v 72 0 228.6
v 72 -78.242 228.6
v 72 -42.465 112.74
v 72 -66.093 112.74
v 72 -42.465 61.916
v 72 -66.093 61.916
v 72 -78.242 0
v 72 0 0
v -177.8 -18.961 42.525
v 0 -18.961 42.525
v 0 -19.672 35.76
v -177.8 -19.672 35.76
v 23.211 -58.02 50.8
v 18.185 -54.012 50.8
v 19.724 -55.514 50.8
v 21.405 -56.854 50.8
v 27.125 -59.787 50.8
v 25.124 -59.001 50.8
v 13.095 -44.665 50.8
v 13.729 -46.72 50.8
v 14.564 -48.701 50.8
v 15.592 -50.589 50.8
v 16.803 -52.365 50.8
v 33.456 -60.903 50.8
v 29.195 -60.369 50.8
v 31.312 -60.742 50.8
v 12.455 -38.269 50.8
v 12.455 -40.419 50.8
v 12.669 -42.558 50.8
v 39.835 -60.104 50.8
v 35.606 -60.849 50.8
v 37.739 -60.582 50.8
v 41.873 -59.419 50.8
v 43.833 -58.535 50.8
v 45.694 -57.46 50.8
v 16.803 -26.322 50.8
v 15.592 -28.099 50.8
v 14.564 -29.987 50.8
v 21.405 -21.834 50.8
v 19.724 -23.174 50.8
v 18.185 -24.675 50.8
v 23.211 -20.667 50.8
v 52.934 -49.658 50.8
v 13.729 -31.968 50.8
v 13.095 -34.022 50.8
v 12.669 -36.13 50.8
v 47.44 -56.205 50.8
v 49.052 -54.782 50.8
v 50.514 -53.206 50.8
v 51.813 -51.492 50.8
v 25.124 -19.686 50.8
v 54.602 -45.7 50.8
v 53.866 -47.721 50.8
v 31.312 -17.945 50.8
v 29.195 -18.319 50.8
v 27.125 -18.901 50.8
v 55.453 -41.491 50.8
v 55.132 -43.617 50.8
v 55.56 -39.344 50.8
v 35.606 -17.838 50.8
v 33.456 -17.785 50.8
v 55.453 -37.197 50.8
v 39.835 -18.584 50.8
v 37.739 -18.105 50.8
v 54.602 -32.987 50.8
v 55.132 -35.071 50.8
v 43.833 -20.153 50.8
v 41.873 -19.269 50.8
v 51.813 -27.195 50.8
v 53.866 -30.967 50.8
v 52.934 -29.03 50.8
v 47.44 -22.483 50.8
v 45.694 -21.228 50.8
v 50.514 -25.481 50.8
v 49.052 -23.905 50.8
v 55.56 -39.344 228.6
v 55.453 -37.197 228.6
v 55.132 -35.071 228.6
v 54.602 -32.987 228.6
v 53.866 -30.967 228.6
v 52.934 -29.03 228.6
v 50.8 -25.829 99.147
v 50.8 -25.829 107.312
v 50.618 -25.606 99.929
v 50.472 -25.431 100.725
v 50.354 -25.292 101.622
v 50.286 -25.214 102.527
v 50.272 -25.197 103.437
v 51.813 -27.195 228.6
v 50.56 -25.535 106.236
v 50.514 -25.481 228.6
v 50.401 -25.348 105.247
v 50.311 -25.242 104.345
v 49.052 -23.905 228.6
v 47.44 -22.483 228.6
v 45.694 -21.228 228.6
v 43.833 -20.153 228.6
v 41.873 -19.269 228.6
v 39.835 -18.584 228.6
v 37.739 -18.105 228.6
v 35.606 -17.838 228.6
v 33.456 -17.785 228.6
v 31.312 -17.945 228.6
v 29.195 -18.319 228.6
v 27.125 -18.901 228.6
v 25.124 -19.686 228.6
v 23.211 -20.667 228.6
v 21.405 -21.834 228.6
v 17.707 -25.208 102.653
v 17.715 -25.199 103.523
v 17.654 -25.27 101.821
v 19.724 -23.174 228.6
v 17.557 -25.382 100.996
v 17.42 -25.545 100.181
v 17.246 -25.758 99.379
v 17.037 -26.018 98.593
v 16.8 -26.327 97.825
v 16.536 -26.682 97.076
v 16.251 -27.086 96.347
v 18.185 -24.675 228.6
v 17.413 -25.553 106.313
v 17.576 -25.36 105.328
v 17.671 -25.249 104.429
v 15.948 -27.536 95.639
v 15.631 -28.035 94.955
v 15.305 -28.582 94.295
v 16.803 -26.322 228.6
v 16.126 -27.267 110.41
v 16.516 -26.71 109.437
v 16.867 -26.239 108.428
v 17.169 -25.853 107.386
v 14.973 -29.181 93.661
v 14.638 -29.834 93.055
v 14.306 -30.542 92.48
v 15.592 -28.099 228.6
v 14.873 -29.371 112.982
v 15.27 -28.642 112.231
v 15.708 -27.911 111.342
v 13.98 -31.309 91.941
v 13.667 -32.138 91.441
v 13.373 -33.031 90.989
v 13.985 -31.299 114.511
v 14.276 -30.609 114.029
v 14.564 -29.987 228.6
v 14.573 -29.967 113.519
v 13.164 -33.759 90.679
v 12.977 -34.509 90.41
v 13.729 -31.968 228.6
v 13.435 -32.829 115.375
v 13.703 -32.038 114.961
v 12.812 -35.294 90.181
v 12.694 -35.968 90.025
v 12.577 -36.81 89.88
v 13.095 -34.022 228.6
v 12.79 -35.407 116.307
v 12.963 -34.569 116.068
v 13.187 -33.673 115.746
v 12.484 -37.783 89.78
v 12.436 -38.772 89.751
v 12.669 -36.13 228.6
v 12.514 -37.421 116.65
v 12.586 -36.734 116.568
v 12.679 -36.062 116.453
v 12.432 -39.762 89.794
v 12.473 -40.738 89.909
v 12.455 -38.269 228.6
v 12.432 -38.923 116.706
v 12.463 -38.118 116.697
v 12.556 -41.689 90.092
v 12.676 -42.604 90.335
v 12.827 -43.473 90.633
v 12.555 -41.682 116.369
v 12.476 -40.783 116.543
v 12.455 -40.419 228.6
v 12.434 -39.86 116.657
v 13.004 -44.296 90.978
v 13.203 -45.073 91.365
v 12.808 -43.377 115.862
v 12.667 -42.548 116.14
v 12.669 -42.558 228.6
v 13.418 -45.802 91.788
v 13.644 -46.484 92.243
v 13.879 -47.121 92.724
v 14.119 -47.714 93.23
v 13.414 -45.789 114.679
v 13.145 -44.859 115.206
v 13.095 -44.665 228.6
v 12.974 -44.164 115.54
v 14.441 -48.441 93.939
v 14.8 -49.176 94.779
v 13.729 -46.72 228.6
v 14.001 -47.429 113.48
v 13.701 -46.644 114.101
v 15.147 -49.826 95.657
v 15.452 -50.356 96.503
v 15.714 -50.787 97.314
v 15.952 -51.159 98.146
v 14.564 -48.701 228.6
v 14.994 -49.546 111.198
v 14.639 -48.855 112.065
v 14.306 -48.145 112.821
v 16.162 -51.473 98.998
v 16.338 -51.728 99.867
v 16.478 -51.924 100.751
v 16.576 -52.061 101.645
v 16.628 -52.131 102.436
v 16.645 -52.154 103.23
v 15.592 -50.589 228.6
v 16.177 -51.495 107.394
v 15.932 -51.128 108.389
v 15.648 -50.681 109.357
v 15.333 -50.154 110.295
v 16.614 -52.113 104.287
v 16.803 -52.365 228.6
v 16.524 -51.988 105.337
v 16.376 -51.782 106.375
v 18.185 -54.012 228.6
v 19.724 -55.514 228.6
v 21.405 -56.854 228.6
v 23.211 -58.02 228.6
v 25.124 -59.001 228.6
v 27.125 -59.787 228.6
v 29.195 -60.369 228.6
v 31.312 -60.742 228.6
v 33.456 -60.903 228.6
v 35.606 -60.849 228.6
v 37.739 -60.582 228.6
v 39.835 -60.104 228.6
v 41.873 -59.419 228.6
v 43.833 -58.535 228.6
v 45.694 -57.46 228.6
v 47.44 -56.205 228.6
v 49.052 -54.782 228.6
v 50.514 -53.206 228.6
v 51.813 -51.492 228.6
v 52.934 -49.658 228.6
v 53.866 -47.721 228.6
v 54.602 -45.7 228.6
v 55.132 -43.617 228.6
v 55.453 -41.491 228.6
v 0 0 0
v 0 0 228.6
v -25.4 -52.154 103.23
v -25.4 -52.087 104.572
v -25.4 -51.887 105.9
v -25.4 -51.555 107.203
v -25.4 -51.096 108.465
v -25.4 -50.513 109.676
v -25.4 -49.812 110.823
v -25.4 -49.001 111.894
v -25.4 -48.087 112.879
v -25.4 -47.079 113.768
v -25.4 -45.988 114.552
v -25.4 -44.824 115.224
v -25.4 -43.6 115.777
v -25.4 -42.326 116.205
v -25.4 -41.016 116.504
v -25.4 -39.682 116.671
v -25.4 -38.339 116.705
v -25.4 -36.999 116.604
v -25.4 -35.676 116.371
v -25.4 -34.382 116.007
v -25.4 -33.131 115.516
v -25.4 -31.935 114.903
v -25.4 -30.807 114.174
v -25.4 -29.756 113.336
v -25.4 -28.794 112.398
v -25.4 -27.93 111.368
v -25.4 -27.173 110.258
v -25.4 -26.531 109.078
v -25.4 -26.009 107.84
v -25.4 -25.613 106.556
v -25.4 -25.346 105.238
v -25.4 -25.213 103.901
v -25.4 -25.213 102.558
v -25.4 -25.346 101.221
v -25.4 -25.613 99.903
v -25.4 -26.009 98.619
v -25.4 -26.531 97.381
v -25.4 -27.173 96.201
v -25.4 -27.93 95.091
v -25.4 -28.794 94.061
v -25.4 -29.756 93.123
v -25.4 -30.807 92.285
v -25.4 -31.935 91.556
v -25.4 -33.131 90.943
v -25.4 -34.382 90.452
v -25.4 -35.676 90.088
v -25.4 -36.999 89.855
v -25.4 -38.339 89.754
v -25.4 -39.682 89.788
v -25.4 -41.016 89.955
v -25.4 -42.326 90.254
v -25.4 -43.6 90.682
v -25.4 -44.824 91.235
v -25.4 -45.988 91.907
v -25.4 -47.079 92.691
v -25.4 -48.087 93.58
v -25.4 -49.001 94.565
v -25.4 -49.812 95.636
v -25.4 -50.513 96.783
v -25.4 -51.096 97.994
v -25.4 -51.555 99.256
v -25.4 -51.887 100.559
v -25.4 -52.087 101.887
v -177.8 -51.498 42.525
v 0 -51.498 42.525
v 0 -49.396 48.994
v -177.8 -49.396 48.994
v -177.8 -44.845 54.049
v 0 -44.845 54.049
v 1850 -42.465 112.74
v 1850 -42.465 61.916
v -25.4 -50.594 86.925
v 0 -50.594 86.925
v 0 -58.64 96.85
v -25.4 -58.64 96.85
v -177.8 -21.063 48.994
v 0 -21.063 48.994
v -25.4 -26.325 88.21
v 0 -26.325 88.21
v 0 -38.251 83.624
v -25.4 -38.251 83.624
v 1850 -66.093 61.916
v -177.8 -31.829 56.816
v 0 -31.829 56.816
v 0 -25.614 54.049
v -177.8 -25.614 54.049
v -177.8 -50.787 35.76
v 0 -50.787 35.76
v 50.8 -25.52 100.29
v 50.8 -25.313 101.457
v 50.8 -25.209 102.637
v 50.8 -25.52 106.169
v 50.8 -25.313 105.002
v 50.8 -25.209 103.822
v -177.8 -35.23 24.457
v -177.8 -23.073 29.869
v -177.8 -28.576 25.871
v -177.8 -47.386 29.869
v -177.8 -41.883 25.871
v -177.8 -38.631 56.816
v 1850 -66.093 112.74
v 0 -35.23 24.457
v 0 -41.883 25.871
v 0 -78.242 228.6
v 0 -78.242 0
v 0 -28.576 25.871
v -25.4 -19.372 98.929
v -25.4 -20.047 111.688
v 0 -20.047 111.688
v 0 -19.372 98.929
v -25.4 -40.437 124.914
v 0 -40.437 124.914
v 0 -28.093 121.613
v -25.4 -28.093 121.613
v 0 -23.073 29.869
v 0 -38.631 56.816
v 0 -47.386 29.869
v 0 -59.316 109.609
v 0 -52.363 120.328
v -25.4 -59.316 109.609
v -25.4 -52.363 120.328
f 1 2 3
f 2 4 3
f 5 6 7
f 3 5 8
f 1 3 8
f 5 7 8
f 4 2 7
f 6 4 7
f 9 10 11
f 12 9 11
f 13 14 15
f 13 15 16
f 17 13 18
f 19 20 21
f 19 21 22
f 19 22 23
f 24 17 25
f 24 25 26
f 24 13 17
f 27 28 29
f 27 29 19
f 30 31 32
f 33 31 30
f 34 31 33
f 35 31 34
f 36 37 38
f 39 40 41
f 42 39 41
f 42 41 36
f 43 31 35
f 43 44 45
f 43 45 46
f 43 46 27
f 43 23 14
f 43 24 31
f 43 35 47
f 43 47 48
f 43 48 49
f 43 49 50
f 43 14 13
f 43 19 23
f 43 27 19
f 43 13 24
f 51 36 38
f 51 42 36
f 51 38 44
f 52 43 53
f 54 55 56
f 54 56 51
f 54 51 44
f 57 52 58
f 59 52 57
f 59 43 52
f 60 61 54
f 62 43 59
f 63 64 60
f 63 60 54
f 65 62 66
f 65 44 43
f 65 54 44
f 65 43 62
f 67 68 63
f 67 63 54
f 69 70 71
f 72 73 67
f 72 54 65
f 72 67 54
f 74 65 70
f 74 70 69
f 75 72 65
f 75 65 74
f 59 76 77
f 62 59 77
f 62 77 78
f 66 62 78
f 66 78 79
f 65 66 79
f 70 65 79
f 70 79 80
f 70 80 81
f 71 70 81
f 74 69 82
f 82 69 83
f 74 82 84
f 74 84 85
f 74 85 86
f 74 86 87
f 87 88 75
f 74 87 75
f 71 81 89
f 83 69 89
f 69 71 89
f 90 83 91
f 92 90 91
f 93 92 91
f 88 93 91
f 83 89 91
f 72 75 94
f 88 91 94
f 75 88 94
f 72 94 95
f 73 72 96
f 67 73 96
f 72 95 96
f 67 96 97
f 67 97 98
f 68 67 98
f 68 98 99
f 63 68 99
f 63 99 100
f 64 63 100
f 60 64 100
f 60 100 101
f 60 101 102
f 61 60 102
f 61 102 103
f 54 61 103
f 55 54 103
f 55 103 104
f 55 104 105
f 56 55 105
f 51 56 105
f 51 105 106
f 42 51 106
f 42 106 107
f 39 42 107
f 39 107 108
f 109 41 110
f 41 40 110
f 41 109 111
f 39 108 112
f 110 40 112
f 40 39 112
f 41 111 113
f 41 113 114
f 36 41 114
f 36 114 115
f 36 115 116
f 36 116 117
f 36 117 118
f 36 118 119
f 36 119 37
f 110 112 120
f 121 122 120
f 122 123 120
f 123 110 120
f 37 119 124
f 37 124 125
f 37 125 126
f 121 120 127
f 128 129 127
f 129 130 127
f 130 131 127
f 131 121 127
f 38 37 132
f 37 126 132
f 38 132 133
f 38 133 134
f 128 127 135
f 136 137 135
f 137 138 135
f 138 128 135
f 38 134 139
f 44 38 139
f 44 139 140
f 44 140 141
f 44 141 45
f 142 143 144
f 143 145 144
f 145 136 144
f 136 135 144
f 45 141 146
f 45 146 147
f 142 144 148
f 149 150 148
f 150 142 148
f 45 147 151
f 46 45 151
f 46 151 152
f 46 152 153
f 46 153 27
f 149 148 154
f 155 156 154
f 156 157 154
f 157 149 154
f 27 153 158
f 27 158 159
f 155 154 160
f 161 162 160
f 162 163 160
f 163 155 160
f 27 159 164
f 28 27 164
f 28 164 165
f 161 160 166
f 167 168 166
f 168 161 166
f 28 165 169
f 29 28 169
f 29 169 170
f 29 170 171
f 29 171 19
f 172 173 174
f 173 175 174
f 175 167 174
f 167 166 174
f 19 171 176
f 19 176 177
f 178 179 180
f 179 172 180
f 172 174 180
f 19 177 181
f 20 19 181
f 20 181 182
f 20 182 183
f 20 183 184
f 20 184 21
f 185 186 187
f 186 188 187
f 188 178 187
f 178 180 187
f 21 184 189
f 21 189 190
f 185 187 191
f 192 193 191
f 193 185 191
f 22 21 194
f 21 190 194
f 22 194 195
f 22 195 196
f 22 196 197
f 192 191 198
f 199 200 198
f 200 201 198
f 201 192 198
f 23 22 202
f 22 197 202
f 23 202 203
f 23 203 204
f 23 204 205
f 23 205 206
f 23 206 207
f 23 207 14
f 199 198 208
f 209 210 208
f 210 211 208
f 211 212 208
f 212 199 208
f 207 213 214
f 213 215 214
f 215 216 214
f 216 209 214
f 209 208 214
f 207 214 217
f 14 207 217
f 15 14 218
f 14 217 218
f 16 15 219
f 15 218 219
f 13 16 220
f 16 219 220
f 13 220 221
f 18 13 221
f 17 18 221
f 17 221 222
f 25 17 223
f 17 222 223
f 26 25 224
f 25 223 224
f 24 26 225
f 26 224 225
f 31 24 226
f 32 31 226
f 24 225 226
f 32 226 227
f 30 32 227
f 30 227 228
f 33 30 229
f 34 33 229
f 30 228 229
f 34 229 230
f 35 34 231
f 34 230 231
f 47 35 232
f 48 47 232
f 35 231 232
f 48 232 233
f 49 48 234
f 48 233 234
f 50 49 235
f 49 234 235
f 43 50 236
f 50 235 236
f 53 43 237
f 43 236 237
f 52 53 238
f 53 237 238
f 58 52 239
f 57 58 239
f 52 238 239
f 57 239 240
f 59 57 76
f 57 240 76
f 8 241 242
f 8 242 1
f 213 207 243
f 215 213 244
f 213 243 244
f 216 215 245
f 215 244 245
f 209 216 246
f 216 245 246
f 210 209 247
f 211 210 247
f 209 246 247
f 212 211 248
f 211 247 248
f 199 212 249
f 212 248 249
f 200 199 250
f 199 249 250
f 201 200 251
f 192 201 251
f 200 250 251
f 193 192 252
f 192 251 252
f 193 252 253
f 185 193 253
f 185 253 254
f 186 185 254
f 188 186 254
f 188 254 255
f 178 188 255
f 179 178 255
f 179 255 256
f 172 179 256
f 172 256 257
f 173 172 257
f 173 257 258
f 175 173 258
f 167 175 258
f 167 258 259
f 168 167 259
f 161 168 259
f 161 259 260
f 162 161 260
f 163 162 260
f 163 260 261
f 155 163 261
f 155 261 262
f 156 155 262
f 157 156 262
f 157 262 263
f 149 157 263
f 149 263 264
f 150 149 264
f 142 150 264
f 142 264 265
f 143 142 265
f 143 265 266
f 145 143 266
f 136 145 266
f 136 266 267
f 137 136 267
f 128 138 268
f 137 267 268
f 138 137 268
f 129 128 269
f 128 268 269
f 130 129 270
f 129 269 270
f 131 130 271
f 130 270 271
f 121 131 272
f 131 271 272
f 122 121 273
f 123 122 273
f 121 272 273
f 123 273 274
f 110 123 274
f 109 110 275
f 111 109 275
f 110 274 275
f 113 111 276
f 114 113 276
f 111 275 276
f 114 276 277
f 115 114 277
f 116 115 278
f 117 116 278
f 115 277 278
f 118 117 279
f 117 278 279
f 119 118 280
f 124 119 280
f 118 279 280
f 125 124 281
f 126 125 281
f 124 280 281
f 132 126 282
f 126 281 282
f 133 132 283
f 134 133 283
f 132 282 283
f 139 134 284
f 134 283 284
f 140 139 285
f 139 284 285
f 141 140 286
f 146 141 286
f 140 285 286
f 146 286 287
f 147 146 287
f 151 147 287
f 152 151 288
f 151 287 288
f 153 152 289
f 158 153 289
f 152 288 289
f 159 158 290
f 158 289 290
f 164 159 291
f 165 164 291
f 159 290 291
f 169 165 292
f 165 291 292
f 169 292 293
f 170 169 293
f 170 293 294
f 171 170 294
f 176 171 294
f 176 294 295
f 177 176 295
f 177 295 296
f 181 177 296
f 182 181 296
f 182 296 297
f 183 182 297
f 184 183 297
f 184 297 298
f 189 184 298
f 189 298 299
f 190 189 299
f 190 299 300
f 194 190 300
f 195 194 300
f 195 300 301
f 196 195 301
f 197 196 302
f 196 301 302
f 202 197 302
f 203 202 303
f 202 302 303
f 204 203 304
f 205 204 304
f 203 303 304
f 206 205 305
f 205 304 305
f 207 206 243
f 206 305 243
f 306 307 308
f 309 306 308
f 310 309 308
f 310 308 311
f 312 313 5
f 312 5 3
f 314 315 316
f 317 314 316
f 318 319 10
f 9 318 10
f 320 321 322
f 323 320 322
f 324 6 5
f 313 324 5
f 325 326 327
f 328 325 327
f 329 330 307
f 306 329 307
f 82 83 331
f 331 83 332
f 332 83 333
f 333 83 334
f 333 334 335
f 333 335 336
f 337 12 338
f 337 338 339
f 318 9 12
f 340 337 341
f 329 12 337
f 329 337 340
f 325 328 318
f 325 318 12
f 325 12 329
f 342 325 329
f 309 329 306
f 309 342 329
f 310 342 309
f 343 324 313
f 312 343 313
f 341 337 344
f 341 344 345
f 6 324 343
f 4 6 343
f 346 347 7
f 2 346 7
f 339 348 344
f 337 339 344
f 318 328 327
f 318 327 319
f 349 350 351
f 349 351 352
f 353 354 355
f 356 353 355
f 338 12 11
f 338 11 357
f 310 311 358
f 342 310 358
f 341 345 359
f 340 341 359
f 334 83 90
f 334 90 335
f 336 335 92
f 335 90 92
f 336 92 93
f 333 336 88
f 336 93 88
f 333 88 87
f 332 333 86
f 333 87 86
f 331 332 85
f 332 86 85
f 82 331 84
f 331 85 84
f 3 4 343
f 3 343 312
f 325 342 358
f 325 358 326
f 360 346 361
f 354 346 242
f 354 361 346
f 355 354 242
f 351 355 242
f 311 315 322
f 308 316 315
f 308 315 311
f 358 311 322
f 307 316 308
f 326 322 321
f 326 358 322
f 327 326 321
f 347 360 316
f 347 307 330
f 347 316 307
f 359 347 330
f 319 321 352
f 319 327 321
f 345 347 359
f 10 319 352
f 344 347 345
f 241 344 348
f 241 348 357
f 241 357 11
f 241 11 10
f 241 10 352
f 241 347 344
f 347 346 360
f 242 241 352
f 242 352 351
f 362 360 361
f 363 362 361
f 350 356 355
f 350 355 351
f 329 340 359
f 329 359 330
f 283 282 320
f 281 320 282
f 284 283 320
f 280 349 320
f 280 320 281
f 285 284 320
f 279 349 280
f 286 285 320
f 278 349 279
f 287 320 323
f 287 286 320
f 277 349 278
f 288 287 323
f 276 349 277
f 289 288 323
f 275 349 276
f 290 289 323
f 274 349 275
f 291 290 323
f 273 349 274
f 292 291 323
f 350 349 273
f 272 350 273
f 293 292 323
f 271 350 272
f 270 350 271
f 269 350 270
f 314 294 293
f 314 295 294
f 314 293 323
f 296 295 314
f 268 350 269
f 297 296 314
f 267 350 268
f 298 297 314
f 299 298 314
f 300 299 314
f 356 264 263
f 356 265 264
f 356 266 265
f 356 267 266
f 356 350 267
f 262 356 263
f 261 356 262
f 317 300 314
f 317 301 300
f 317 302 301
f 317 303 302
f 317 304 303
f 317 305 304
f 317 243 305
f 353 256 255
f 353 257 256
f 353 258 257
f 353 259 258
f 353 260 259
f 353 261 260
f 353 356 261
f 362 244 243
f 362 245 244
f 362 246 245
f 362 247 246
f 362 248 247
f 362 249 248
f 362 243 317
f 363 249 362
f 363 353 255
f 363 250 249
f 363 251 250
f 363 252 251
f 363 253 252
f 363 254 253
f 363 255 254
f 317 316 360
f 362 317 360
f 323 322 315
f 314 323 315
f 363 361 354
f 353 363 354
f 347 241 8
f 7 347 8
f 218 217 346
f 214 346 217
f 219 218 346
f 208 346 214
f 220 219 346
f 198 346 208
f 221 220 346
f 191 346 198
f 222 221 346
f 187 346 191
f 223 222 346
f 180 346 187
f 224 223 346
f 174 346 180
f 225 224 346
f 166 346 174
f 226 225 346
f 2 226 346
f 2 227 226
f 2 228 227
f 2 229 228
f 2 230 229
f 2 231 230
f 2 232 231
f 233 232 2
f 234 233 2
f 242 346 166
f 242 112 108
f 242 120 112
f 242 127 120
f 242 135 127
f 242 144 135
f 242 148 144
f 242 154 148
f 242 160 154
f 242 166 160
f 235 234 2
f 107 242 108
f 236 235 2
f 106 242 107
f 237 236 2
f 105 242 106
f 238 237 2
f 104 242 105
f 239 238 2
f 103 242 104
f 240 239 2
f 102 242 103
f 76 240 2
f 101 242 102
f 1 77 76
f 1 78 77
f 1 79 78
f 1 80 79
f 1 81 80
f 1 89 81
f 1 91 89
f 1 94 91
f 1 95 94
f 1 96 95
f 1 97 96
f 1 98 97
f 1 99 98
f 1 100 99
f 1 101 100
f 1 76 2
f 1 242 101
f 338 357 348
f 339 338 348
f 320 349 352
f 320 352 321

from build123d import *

# Parameters (mm, degrees)
F0_W      = 72.000258
F0_H      = 78.241773
F1_DEPTH  = 228.6
F3_DEPTH  = 25.4
F4_R      = 21.565996
F5_DEPTH  = 177.8
F6_R      = 13.479232
F7_DEPTH  = 76.2
F8_W      = 23.628573
F8_H      = 50.823714
F9_DEPTH  = 1778
F11_DEPTH = 177.8


with BuildPart() as f1:
    # F0 (on Top) → F1 (new body)
    with BuildSketch(Plane.XY):
        with Locations((36.000129, -39.120886)):
            Rectangle(F0_W, F0_H)
    extrude(amount=F1_DEPTH)

    # F2 (on face) → F3 (join)
    with BuildSketch(Plane(origin=(0, 0, 0), x_dir=(0, -1, 0), z_dir=(-1, 0, 0))):
        Polygon((59.31577, 109.609046), (52.362666, 120.328418), (40.436798, 124.913641), (28.093442, 121.613314), (20.04734, 111.688051), (19.371831, 98.928965), (26.324935, 88.209593), (38.250803, 83.62437), (50.594159, 86.924697), (58.64026, 96.84996), align=None)
    extrude(amount=F3_DEPTH)

    # F4 (on face) → F5 (cut)
    with BuildSketch(Plane.XY.offset(228.6)):
        with Locations((33.99393, -39.343797)):
            Circle(F4_R)
    extrude(amount=-F5_DEPTH, mode=Mode.SUBTRACT)

    # F6 (on face) → F7 (cut)
    with BuildSketch(Plane(origin=(-25.4, 0, 0), x_dir=(0, -1, 0), z_dir=(-1, 0, 0))):
        with Locations((38.675066, 103.229503)):
            Circle(F6_R)
    extrude(amount=-F7_DEPTH, mode=Mode.SUBTRACT)

    # F8 (on face) → F9 (join)
    with BuildSketch(Plane.YZ.offset(72.000258)):
        with Locations((-54.278838, 87.327758)):
            Rectangle(F8_W, F8_H)
    extrude(amount=F9_DEPTH)

    # F10 (on face) → F11 (join)
    with BuildSketch(Plane(origin=(0, 0, 0), x_dir=(0, -1, 0), z_dir=(-1, 0, 0))):
        Polygon((38.63069, 56.816015), (31.828527, 56.816015), (25.614442, 54.049327), (21.062907, 48.994335), (18.960923, 42.525093), (19.671943, 35.760194), (23.073024, 29.869348), (28.576089, 25.871137), (35.229608, 24.456888), (41.883128, 25.871137), (47.386193, 29.869348), (50.787274, 35.760194), (51.498294, 42.525093), (49.39631, 48.994335), (44.844775, 54.049327), align=None)
    extrude(amount=F11_DEPTH)


solid = f1.part
